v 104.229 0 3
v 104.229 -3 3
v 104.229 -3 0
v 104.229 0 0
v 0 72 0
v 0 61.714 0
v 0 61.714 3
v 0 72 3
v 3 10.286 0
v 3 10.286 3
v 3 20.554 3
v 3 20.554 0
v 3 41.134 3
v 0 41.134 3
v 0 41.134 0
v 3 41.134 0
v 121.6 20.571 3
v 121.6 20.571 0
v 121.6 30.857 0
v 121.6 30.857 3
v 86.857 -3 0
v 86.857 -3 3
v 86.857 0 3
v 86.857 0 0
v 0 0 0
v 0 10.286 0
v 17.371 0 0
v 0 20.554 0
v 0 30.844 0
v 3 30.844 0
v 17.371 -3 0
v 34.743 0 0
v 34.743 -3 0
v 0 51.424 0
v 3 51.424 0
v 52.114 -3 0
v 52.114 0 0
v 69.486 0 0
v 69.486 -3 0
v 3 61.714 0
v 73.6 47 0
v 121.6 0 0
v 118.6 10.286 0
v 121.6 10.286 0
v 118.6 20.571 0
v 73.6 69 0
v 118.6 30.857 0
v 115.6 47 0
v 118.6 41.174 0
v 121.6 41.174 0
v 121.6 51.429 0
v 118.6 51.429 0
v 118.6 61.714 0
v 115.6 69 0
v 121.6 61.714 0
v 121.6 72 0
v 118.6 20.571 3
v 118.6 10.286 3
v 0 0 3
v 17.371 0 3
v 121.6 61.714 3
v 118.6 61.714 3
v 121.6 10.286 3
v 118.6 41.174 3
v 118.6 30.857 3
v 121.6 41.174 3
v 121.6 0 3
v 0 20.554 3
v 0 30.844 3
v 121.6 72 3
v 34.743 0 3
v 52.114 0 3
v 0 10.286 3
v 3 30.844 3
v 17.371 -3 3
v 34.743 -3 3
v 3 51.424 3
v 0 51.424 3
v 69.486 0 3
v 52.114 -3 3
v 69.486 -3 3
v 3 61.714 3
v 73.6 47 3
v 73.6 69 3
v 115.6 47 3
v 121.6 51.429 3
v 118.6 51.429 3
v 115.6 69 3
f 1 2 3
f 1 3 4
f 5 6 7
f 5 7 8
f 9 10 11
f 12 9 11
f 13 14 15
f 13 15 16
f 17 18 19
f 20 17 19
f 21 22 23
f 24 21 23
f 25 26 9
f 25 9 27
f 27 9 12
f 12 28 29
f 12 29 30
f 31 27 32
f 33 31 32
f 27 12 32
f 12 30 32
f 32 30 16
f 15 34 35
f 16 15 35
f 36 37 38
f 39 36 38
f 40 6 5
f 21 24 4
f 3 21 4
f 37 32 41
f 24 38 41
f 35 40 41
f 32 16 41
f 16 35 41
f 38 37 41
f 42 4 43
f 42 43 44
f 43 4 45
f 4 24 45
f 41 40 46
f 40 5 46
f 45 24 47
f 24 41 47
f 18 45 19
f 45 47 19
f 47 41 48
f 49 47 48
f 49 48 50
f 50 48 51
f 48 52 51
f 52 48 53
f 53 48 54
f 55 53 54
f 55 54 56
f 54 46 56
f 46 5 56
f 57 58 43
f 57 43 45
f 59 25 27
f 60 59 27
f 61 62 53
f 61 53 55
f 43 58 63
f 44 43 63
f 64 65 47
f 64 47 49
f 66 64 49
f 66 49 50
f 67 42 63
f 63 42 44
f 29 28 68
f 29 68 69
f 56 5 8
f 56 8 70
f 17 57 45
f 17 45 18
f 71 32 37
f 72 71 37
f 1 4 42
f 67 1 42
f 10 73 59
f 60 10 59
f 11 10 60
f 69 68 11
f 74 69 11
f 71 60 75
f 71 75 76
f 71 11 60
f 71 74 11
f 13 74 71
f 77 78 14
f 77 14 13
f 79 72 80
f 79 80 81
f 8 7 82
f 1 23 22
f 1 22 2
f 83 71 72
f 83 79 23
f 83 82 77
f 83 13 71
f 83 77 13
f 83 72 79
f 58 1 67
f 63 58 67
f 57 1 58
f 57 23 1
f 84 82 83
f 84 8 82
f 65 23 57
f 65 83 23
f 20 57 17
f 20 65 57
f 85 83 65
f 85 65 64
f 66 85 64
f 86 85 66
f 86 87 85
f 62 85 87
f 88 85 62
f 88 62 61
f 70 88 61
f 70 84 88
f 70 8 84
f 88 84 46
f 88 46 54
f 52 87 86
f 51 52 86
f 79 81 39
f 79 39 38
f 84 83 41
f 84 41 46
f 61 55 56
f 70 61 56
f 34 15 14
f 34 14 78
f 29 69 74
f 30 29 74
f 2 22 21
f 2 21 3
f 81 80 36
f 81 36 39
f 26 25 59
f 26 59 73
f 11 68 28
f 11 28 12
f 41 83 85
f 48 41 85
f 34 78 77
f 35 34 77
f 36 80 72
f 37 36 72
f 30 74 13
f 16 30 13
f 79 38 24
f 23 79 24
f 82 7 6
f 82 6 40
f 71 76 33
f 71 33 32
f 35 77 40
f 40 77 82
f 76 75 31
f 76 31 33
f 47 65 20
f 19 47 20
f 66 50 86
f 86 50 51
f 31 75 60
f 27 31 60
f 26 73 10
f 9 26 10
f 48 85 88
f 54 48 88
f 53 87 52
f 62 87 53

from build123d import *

# Parameters (mm, degrees)
SKETCH1_W           = 121.6
SKETCH1_H           = 72
BOSS_EXTRUDE1_DEPTH = 3
CUT_EXTRUDE1_REACH  = 5
SKETCH4_W           = 42
SKETCH4_H           = 22
SKETCH6_W           = 3
SKETCH6_H           = 10.285714
SKETCH6_H_2         = 10.316450419
SKETCH6_H_3         = 10.26857
SKETCH6_H_4         = 10.29
CUT_EXTRUDE2_DEPTH  = 4
SKETCH7_W           = 17.37142857
SKETCH7_H           = 3
BOSS_EXTRUDE2_DEPTH = 3


with BuildPart() as part:
    # Sketch1 → Boss-Extrude1 (new body)
    with BuildSketch(Plane.XY):
        with Locations((60.8, 36)):
            Rectangle(SKETCH1_W, SKETCH1_H)
    extrude(amount=BOSS_EXTRUDE1_DEPTH)

    # Sketch4 → Cut-Extrude1 (cut, up to next)
    with BuildSketch(Plane.XY.offset(3), mode=Mode.PRIVATE) as cut_extrude1_sk1:
        with Locations((94.6, 58)):
            Rectangle(SKETCH4_W, SKETCH4_H)
    cut_extrude1_tool1 = extrude(cut_extrude1_sk1.sketch, amount=-CUT_EXTRUDE1_REACH, mode=Mode.PRIVATE) & part.part
    add(cut_extrude1_tool1.solids().sort_by_distance((94.6, 58, 3))[0], mode=Mode.SUBTRACT)

    # Sketch6 → Cut-Extrude2 (cut, through all)
    with BuildSketch(Plane.XY.offset(3)):
        with Locations((120.1, 56.571428714)):
            Rectangle(SKETCH6_W, SKETCH6_H)
        with Locations((120.1, 36.015368924)):
            Rectangle(SKETCH6_W, SKETCH6_H_2)
        with Locations((120.1, 15.428572714)):
            Rectangle(SKETCH6_W, SKETCH6_H)
        with Locations((1.5, 15.420000714)):
            Rectangle(SKETCH6_W, SKETCH6_H_3)
        with Locations((1.5, 35.989285714)):
            Rectangle(SKETCH6_W, SKETCH6_H_4)
        with Locations((1.5, 56.569285714)):
            Rectangle(SKETCH6_W, SKETCH6_H_4)
    extrude(amount=-CUT_EXTRUDE2_DEPTH, mode=Mode.SUBTRACT)

    # Sketch7 → Boss-Extrude2 (add)
    with BuildSketch(Plane.XY.offset(3)):
        with Locations((95.542857144, -1.5)):
            Rectangle(SKETCH7_W, SKETCH7_H)
        with Locations((60.800000004, -1.5)):
            Rectangle(SKETCH7_W, SKETCH7_H)
        with Locations((26.057142864, -1.5)):
            Rectangle(SKETCH7_W, SKETCH7_H)
    extrude(amount=-BOSS_EXTRUDE2_DEPTH)


solid = part.part
